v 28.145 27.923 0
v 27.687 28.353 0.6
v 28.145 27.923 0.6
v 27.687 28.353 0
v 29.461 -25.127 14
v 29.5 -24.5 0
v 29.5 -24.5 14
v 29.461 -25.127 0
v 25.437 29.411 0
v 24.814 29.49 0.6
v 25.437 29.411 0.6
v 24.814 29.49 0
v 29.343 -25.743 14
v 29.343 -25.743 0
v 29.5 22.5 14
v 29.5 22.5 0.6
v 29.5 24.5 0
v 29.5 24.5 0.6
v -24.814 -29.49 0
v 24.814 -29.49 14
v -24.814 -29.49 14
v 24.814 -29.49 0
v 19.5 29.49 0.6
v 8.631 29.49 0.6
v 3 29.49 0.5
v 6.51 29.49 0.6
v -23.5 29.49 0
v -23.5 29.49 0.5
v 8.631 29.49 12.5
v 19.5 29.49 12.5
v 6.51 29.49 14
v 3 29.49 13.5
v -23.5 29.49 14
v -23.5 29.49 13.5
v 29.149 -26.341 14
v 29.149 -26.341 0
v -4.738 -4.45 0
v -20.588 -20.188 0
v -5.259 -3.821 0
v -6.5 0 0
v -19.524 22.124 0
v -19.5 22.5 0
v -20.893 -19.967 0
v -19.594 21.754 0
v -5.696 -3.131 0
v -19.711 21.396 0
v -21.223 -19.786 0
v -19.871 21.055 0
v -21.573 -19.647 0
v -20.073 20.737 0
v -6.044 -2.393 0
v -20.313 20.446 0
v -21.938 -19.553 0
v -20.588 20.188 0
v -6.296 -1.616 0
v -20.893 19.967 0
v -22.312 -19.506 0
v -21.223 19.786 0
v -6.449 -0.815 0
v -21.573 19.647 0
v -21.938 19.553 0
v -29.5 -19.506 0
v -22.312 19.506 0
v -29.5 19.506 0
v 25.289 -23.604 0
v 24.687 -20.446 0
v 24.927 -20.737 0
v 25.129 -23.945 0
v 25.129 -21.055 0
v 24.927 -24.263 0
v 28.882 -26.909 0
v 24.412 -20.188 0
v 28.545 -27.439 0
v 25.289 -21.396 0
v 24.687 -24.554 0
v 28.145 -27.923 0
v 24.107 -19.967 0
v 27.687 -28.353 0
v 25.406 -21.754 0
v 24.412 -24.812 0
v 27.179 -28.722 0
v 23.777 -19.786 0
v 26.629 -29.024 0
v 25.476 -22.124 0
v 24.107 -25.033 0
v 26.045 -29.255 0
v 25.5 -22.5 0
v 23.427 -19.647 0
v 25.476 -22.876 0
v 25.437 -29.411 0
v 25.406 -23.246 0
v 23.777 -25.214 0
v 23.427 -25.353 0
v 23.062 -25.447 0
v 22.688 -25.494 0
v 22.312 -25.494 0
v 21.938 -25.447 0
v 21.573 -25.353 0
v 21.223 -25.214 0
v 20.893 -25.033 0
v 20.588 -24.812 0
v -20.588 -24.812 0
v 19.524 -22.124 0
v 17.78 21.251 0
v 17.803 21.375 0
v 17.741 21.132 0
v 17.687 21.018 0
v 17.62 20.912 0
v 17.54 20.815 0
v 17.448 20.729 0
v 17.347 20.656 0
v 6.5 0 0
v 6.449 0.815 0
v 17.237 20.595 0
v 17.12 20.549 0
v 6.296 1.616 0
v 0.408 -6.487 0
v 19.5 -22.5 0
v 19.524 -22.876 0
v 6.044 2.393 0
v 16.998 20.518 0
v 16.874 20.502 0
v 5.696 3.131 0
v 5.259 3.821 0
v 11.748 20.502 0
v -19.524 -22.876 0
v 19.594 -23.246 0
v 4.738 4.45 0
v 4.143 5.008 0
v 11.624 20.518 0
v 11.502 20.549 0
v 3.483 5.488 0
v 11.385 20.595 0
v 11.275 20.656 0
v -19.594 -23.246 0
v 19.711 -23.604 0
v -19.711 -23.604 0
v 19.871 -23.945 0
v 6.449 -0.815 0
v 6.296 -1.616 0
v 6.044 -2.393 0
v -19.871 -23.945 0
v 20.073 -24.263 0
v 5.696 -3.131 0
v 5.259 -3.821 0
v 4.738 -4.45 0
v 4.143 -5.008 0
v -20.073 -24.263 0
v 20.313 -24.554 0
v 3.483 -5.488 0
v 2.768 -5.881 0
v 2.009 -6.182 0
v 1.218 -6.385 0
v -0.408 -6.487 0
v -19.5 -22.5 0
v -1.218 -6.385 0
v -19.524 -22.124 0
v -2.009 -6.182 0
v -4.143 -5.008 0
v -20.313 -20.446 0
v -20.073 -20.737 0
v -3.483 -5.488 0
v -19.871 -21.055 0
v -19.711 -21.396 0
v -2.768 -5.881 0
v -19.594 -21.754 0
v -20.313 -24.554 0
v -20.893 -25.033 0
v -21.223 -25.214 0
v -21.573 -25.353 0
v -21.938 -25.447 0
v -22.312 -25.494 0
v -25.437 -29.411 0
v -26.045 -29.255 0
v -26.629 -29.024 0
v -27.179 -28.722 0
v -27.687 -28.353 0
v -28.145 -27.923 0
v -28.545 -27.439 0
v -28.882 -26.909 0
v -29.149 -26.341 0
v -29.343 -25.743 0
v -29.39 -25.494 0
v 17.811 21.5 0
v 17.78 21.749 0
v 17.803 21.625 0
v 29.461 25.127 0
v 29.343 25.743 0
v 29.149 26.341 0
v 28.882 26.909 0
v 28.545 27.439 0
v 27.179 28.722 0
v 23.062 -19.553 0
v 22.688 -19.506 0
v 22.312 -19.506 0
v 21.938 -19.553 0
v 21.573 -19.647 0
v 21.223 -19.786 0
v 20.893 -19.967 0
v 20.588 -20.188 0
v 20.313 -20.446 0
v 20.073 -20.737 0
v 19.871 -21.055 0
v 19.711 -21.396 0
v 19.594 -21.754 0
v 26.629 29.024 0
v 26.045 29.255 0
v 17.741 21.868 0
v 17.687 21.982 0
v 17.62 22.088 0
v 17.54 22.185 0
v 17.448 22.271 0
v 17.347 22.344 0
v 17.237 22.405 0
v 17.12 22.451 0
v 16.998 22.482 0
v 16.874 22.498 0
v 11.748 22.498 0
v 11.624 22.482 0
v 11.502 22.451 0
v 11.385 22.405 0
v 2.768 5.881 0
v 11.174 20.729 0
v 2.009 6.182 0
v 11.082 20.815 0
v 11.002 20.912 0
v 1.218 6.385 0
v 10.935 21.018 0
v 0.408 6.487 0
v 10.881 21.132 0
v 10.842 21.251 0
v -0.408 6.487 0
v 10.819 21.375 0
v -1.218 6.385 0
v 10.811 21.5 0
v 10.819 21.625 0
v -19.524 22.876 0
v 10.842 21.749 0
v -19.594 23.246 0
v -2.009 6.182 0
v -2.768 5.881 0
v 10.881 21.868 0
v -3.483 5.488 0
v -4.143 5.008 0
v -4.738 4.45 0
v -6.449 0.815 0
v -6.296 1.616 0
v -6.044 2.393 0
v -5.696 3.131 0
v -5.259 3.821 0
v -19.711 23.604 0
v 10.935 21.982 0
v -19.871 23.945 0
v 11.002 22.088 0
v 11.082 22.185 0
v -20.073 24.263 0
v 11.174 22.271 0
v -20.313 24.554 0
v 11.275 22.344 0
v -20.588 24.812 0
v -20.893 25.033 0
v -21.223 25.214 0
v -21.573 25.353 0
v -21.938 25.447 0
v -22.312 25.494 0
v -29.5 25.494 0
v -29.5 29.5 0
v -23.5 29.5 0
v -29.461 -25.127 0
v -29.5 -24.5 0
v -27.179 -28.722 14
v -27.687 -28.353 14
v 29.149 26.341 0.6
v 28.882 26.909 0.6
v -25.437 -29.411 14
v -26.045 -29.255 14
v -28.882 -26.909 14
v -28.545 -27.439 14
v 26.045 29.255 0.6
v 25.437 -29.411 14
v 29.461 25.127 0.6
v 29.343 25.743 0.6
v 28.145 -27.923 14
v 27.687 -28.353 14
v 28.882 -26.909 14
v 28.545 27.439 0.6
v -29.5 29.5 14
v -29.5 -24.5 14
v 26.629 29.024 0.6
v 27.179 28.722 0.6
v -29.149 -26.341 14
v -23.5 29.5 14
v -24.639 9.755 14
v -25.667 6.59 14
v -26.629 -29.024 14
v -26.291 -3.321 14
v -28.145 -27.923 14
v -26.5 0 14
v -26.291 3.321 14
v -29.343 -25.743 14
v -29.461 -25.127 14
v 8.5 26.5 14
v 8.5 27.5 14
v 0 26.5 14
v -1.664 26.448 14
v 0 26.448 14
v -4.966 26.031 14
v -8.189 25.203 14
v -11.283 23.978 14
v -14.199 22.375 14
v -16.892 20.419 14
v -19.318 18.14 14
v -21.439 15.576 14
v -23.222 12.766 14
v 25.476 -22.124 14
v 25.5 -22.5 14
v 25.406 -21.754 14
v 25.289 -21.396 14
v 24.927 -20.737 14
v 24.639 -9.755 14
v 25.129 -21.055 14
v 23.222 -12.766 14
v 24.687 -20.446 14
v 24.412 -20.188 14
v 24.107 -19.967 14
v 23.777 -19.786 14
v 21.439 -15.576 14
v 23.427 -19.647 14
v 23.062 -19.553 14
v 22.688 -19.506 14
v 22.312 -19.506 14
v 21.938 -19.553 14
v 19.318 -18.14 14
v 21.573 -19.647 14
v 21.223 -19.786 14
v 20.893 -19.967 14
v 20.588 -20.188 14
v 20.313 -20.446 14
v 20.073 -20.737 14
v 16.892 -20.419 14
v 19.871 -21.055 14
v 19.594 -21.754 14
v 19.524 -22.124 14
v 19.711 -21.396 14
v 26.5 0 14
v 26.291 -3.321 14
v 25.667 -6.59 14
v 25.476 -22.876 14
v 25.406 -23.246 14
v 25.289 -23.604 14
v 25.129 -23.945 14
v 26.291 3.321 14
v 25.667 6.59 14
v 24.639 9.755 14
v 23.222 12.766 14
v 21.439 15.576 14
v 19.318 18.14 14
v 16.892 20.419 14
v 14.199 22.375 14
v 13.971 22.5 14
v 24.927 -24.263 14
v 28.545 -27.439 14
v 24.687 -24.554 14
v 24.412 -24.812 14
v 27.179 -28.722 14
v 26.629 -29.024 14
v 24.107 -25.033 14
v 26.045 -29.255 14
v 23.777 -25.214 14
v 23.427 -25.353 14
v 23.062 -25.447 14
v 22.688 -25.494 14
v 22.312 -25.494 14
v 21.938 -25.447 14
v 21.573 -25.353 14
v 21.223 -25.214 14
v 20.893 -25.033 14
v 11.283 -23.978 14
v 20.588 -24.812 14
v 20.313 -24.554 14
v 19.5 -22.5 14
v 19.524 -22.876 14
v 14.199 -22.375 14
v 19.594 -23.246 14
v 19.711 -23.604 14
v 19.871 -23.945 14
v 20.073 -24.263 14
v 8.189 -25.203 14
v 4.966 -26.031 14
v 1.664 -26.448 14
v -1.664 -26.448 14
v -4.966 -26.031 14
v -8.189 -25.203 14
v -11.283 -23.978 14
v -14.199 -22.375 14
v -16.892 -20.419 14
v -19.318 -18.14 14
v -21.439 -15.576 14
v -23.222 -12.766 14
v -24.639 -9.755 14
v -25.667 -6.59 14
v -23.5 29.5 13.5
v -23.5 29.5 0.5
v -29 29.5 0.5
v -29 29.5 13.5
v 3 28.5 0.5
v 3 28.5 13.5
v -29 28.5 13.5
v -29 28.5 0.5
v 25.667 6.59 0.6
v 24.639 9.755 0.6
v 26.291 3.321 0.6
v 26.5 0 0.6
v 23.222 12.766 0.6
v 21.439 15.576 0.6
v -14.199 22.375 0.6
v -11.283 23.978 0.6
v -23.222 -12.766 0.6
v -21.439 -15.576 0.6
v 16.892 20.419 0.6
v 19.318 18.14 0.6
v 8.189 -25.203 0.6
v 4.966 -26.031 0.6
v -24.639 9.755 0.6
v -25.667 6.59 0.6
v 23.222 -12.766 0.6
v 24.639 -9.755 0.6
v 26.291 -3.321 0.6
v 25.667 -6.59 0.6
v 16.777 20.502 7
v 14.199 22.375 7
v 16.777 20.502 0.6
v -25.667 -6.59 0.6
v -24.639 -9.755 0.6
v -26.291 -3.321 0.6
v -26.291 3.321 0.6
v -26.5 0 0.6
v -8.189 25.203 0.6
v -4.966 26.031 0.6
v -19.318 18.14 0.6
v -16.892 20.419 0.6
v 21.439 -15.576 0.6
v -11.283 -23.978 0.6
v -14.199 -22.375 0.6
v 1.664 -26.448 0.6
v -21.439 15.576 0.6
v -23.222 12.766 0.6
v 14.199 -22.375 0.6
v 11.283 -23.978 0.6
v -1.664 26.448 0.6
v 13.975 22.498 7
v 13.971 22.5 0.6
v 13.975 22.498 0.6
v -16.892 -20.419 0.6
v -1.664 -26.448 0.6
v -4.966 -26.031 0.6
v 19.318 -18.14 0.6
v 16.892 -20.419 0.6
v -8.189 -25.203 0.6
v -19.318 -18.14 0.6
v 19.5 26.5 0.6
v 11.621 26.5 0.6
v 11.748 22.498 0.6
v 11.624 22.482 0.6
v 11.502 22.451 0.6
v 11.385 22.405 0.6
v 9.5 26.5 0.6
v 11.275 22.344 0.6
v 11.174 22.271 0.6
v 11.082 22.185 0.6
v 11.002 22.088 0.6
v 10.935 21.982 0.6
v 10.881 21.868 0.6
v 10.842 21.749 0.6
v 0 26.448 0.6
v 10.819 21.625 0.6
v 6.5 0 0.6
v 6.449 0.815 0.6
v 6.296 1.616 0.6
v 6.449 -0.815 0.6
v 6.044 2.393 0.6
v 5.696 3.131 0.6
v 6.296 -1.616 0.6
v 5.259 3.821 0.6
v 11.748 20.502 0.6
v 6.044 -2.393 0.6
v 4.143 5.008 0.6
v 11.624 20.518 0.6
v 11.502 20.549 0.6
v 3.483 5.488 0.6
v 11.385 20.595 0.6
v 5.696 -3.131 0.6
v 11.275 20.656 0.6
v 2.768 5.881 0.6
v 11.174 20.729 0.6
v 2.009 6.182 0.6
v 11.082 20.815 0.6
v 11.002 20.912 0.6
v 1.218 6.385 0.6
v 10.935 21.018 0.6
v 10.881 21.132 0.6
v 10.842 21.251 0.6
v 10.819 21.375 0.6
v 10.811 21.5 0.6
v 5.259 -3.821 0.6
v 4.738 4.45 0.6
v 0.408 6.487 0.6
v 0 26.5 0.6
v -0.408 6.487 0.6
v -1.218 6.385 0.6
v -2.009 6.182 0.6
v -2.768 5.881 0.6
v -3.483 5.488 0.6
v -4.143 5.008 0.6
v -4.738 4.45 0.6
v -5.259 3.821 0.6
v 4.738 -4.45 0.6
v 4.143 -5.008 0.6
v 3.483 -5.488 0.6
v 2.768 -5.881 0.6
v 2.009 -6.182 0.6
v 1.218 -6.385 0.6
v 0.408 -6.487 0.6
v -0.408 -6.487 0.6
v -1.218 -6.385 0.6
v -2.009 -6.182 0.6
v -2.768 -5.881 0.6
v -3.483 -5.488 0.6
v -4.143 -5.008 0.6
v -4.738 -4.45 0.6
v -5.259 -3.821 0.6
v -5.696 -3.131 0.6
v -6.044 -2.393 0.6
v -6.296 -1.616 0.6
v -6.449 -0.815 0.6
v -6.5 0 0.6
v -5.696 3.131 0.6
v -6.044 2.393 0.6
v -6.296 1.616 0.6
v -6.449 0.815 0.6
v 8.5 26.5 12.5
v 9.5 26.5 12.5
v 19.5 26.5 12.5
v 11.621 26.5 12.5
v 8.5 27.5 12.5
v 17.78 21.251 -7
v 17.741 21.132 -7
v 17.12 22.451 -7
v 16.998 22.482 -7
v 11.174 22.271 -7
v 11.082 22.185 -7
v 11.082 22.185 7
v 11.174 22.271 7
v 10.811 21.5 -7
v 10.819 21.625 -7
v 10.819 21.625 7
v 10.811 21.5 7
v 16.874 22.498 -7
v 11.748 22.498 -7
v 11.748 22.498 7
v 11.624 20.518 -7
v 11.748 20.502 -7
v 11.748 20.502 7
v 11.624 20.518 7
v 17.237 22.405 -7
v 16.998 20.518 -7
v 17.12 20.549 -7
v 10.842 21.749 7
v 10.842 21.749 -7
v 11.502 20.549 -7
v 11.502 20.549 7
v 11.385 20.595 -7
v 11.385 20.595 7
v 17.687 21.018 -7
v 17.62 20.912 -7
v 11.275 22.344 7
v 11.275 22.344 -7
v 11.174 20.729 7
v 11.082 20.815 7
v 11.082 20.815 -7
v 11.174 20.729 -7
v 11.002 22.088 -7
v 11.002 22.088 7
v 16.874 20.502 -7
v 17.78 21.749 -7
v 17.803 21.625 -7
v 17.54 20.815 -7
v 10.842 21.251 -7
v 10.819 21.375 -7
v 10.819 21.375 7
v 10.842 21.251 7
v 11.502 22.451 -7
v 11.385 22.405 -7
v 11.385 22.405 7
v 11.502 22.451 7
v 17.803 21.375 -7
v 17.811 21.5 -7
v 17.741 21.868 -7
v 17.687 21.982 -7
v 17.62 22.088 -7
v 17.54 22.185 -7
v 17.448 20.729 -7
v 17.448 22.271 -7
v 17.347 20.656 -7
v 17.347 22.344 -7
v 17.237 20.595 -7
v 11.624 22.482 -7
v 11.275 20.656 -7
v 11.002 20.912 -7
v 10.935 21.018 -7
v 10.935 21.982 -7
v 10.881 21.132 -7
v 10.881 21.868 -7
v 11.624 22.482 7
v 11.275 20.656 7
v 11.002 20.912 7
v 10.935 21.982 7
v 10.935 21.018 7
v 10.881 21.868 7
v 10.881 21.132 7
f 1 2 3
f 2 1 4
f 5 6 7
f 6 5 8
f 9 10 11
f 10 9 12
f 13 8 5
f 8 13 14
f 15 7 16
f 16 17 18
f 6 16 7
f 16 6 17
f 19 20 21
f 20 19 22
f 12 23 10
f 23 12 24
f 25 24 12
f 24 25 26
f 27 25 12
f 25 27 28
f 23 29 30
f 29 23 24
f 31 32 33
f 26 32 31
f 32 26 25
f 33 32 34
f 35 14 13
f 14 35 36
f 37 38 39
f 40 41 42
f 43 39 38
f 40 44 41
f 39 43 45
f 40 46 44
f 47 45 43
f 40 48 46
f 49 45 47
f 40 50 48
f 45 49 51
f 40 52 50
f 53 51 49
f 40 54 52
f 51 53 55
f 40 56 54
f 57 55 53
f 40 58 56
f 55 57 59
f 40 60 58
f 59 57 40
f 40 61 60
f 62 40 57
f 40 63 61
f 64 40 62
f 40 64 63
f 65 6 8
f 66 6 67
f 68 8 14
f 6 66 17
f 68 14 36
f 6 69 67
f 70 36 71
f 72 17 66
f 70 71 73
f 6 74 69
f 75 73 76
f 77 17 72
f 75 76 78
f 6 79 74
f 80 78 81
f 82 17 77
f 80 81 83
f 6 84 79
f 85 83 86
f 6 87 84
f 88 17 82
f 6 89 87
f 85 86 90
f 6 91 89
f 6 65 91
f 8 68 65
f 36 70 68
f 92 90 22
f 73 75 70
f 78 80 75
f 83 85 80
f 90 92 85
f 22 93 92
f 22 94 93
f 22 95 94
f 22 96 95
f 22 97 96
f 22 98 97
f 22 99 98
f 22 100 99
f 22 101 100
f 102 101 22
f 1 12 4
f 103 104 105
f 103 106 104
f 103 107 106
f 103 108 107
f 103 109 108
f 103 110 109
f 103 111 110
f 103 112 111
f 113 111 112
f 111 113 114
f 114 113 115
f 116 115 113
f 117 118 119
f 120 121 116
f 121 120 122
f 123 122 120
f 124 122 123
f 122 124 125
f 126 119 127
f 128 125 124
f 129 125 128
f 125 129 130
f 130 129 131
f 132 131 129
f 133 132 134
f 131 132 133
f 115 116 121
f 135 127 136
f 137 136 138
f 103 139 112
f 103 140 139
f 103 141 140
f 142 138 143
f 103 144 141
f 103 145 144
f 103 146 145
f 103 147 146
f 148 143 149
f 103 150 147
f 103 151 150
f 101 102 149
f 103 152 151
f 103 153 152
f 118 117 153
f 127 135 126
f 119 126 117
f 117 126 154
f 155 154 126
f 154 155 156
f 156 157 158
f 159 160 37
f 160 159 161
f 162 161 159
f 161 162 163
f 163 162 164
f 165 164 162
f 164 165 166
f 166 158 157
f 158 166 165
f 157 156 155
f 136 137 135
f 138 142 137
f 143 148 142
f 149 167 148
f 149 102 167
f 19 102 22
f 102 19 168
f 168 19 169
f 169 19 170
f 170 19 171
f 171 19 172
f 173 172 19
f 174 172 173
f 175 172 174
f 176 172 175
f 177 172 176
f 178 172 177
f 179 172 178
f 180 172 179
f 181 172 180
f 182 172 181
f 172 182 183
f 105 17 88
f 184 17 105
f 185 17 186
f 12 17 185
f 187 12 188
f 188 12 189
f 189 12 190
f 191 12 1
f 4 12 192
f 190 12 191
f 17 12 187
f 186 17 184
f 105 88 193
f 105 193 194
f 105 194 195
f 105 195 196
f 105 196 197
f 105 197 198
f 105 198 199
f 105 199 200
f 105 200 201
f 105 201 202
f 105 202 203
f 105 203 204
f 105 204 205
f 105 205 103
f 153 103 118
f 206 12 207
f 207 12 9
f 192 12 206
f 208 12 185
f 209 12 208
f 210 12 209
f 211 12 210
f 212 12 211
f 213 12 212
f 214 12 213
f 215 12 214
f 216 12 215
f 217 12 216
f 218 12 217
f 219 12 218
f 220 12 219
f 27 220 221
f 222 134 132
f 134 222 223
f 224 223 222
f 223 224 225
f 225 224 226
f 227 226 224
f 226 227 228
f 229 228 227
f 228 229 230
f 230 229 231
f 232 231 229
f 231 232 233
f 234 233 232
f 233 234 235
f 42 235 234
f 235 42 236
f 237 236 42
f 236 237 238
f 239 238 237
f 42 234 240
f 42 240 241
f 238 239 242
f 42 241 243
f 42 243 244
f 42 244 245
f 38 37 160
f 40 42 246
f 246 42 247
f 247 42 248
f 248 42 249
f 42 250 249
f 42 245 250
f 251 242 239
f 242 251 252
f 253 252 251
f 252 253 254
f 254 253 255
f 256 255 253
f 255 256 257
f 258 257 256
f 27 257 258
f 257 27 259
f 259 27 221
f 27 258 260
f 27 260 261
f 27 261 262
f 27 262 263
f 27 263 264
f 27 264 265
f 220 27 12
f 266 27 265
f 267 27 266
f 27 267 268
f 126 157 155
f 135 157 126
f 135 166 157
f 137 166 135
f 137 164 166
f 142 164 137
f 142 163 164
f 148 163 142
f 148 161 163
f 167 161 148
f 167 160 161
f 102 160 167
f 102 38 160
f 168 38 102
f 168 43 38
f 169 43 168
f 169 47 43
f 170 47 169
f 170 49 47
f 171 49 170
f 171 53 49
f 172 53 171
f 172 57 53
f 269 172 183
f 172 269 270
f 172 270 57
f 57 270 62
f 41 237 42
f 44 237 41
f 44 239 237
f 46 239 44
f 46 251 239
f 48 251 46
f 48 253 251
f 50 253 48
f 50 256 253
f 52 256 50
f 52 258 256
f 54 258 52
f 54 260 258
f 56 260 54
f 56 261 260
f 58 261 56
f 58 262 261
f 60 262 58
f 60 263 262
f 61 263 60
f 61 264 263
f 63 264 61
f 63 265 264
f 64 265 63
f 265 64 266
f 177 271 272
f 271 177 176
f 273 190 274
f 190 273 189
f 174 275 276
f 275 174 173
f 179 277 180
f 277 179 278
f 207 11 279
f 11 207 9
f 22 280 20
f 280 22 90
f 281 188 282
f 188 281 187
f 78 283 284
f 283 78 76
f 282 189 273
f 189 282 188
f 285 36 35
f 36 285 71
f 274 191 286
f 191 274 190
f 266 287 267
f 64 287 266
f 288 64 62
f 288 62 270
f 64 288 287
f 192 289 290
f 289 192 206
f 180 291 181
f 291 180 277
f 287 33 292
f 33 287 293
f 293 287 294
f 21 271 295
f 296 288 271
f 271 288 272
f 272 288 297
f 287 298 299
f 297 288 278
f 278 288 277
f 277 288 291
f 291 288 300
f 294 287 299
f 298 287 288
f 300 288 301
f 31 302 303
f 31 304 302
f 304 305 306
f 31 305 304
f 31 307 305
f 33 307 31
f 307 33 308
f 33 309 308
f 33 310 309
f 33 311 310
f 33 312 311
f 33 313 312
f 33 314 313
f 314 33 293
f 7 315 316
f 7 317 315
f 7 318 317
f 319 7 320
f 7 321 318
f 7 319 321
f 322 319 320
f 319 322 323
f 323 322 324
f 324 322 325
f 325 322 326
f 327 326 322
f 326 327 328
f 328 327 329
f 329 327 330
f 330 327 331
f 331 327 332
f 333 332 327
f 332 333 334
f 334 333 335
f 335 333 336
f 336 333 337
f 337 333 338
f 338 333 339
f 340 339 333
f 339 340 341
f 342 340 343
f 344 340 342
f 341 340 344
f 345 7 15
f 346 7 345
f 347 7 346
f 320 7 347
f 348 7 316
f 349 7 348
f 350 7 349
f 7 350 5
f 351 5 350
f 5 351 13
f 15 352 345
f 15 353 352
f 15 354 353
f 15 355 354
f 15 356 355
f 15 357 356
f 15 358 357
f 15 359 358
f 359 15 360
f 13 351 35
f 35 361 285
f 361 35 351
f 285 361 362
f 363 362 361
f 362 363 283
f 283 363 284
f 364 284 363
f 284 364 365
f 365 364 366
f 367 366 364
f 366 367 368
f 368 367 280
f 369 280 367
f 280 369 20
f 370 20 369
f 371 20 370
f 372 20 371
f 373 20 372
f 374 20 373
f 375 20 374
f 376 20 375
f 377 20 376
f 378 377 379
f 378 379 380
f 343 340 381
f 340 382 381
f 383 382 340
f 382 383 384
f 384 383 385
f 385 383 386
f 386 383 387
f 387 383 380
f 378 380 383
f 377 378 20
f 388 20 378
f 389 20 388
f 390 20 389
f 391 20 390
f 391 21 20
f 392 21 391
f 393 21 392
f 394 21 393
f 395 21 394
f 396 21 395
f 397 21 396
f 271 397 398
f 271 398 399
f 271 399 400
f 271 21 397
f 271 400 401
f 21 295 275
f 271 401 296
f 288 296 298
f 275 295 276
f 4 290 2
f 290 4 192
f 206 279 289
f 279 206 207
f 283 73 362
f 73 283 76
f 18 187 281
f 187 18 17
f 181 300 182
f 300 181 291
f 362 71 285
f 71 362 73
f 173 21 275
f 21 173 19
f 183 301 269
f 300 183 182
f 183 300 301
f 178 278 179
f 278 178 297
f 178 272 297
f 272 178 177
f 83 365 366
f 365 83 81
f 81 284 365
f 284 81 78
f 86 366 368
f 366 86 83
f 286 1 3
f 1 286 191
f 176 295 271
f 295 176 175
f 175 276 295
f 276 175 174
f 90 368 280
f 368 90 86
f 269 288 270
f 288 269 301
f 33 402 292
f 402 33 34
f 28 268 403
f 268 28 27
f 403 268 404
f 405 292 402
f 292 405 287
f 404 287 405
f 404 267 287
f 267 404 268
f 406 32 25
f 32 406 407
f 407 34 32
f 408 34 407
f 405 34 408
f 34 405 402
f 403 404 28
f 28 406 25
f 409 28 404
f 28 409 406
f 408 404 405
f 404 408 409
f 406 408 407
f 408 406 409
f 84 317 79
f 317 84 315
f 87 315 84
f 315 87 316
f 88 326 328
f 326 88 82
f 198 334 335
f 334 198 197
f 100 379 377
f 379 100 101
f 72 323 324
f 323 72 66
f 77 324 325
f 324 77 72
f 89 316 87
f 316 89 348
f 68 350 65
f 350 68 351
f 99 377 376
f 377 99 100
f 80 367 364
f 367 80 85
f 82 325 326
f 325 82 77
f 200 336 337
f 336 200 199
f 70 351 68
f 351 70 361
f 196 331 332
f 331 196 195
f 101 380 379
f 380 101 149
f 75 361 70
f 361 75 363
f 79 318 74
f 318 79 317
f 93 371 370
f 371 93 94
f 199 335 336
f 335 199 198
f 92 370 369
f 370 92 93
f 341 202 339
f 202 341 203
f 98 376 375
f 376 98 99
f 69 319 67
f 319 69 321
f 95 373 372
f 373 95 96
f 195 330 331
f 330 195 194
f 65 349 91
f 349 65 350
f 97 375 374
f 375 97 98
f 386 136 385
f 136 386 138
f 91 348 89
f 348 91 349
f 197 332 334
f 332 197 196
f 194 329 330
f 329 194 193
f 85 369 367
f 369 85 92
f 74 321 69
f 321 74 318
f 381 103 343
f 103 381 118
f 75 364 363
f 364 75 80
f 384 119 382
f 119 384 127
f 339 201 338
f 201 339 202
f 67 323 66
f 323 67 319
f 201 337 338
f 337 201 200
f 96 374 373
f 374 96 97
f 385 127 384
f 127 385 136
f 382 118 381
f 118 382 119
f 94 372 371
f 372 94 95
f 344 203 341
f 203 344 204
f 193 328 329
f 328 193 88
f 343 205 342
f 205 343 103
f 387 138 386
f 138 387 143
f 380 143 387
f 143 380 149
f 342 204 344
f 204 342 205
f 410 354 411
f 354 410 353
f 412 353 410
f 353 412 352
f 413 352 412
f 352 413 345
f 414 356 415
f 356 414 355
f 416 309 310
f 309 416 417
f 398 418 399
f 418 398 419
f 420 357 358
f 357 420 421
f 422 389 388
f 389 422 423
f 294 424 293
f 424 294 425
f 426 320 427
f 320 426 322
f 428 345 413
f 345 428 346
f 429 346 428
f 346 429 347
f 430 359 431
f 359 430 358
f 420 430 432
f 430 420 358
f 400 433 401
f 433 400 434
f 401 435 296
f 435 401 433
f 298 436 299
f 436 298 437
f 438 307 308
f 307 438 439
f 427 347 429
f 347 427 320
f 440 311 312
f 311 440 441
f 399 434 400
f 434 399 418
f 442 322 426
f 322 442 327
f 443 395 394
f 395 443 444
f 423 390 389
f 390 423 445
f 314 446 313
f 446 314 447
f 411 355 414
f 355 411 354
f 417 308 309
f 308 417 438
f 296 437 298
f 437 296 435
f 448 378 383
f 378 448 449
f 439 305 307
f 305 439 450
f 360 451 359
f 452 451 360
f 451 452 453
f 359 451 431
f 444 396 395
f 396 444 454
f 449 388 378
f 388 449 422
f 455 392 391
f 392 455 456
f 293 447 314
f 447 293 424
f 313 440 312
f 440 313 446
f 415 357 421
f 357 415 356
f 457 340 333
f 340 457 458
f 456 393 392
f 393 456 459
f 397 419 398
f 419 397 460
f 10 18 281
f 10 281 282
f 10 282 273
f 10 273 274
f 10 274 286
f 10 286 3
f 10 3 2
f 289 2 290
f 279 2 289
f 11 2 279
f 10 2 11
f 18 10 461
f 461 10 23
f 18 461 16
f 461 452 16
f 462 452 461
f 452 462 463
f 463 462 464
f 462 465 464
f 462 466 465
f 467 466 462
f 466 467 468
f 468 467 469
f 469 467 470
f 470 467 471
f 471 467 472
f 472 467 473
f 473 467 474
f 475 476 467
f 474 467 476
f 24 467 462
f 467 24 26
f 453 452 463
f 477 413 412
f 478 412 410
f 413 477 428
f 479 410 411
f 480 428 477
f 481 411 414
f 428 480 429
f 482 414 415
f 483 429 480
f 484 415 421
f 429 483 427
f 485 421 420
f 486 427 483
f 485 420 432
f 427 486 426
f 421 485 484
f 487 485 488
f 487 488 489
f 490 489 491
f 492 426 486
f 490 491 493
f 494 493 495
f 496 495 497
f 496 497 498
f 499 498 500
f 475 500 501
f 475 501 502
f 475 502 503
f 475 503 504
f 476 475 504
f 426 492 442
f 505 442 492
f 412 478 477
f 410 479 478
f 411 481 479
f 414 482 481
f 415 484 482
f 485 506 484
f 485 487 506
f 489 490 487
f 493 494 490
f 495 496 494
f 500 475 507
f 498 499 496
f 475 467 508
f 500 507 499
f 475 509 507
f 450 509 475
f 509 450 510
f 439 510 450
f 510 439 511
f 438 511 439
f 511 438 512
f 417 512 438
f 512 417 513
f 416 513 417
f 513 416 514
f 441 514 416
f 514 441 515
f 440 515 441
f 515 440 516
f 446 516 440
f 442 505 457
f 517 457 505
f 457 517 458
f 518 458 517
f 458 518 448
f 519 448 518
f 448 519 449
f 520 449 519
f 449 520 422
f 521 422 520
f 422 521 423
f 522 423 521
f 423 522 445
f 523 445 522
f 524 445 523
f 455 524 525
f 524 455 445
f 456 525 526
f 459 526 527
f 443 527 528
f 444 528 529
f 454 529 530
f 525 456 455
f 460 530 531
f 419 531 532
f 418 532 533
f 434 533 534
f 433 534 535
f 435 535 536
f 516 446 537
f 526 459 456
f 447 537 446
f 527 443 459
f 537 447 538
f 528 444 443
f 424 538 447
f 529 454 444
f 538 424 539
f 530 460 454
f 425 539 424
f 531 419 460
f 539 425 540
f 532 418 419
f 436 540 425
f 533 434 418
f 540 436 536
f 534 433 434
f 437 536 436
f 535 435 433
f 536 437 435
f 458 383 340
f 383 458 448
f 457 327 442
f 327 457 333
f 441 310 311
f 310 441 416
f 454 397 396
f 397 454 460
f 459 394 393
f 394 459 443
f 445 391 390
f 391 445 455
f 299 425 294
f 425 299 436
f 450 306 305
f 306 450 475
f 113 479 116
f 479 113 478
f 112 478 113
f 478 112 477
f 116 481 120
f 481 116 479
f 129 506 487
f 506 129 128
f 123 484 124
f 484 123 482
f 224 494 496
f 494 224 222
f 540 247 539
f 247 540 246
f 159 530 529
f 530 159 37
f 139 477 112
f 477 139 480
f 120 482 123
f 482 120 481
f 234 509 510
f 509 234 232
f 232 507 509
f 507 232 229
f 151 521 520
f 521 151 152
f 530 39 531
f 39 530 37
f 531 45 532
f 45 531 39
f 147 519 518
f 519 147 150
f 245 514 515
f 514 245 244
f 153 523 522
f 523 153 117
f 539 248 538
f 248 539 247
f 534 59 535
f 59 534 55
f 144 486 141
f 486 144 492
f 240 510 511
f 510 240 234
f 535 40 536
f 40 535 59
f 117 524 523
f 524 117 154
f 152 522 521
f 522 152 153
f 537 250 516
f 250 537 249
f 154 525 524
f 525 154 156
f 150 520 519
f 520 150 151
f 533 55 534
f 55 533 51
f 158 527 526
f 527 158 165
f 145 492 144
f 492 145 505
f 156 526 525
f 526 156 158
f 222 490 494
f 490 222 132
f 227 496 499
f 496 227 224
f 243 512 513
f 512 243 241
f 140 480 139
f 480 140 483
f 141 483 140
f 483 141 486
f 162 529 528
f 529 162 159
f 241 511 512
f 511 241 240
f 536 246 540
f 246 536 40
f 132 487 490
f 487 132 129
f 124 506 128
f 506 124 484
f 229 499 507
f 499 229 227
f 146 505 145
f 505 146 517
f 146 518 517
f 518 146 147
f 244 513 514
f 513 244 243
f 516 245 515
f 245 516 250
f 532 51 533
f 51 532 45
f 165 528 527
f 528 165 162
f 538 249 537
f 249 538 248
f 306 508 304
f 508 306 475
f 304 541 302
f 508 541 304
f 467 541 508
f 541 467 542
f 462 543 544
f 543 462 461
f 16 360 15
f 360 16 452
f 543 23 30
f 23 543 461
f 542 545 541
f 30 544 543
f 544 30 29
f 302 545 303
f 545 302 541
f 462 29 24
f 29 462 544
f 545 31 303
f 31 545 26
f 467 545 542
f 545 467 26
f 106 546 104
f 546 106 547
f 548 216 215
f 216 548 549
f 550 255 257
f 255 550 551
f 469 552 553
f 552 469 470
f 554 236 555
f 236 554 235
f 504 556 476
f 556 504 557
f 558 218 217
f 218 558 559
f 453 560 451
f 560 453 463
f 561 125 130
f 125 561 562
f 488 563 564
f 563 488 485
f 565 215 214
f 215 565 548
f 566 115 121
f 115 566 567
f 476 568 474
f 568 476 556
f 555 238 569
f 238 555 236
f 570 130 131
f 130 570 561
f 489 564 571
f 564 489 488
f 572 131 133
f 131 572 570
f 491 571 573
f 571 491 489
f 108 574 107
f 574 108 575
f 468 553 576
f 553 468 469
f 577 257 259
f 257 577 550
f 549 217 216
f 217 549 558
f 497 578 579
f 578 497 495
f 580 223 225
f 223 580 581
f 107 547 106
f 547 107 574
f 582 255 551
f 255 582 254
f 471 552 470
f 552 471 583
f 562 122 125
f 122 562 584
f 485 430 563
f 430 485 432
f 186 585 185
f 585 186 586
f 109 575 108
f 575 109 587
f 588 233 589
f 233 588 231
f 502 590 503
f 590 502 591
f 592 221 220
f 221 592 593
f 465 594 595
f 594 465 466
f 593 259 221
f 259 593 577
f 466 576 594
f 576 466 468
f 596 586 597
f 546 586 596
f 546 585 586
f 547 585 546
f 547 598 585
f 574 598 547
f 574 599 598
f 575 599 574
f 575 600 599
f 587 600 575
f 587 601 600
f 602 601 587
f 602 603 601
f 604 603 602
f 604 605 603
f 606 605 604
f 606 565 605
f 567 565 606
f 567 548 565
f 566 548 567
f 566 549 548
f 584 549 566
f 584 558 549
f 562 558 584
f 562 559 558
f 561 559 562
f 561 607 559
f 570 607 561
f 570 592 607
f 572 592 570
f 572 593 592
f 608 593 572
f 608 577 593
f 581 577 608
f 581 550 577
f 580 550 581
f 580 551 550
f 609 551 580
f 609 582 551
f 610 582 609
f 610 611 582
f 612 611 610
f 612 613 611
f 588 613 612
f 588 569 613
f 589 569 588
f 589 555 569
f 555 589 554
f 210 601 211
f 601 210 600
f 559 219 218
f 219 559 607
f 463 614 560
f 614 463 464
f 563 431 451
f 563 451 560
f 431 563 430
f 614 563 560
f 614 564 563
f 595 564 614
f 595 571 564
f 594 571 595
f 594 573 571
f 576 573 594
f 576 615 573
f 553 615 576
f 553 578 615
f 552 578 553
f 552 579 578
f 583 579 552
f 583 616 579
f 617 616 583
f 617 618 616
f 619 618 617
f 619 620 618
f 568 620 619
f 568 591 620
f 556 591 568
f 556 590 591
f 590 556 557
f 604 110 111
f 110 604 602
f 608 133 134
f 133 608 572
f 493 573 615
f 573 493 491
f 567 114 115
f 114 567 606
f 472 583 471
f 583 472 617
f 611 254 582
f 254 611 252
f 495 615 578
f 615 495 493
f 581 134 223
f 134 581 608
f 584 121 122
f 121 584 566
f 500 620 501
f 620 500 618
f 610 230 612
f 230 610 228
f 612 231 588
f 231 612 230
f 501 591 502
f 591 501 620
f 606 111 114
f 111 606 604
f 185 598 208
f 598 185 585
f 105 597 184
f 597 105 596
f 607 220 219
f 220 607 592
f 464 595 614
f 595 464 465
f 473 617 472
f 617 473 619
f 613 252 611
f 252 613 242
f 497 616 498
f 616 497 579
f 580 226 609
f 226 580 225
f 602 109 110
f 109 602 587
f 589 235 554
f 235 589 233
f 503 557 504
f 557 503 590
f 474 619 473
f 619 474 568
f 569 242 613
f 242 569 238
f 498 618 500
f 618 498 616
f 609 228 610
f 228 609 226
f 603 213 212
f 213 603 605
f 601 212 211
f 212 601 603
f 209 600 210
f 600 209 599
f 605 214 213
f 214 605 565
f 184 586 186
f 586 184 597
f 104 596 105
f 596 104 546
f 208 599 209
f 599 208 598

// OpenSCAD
$fn = 50;


union() {
	difference() {
		union() {
			hull() {
				translate(v = [-24.5000000000, 24.5000000000, 0]) {
					cylinder(h = 14, r = 5);
				}
				translate(v = [24.5000000000, 24.5000000000, 0]) {
					cylinder(h = 14, r = 5);
				}
				translate(v = [-24.5000000000, -24.5000000000, 0]) {
					cylinder(h = 14, r = 5);
				}
				translate(v = [24.5000000000, -24.5000000000, 0]) {
					cylinder(h = 14, r = 5);
				}
			}
			translate(v = [-29.5000000000, 23.5000000000, 0]) {
				cube(size = [6, 6, 14]);
			}
		}
		union() {
			translate(v = [-30.0000000000, -22.5000000000, -250.0000000000]) {
				rotate(a = [0, 0, 0]) {
					difference() {
						union() {
							hull() {
								translate(v = [7.5000000000, 0, 0]) {
									cylinder(h = 250, r = 3.0000000000, r1 = 3.0000000000, r2 = 3.0000000000);
								}
								translate(v = [-7.5000000000, 0, 0]) {
									cylinder(h = 250, r = 3.0000000000, r1 = 3.0000000000, r2 = 3.0000000000);
								}
							}
						}
						union();
					}
				}
			}
			translate(v = [-30.0000000000, 22.5000000000, -250.0000000000]) {
				rotate(a = [0, 0, 0]) {
					difference() {
						union() {
							hull() {
								translate(v = [7.5000000000, 0, 0]) {
									cylinder(h = 250, r = 3.0000000000, r1 = 3.0000000000, r2 = 3.0000000000);
								}
								translate(v = [-7.5000000000, 0, 0]) {
									cylinder(h = 250, r = 3.0000000000, r1 = 3.0000000000, r2 = 3.0000000000);
								}
							}
						}
						union();
					}
				}
			}
			translate(v = [-29.0000000000, 28.5000000000, 0.5000000000]) {
				cube(size = [32, 1, 13.0000000000]);
			}
			translate(v = [22.5000000000, -22.5000000000, 0]) {
				cylinder(h = 100, r = 3.0000000000);
			}
			translate(v = [0, 0, 0.6000000000]) {
				cylinder(h = 16.4000000000, r = 26.5000000000);
			}
			translate(v = [0, 0, -7.0000000000]) {
				cylinder(h = 14, r = 6.5000000000);
			}
			translate(v = [0.0000000000, 22.5000000000, 0.6000000000]) {
				cube(size = [29.5000000000, 4, 16.4000000000]);
			}
			translate(v = [19.5000000000, 22.5000000000, 0.6000000000]) {
				cube(size = [10, 7, 16.4000000000]);
			}
			translate(v = [8.5000000000, 22.5000000000, 12.5000000000]) {
				cube(size = [21, 7, 1.5000000000]);
			}
			translate(v = [5.7500000000, 30.2500000000, 0.6000000000]) {
				rotate(a = [0, 0, -45]) {
					cube(size = [7.5000000000, 1.5000000000, 16.4000000000]);
				}
			}
			translate(v = [5.0610000000, 20.5000000000, 0.6000000000]) {
				cube(size = [7.5000000000, 2, 13.4000000000]);
			}
		}
	}
	union() {
		translate(v = [14.3110000000, 21.5000000000, -7.0000000000]) {
			rotate(a = [0, 0, 0]) {
				difference() {
					union() {
						#hull() {
							#translate(v = [2.5000000000, 0, 0]) {
								cylinder(h = 14, r = 1.0000000000, r1 = 1.0000000000, r2 = 1.0000000000);
							}
							#translate(v = [-2.5000000000, 0, 0]) {
								cylinder(h = 14, r = 1.0000000000, r1 = 1.0000000000, r2 = 1.0000000000);
							}
						}
					}
					union();
				}
			}
		}
	}
}
